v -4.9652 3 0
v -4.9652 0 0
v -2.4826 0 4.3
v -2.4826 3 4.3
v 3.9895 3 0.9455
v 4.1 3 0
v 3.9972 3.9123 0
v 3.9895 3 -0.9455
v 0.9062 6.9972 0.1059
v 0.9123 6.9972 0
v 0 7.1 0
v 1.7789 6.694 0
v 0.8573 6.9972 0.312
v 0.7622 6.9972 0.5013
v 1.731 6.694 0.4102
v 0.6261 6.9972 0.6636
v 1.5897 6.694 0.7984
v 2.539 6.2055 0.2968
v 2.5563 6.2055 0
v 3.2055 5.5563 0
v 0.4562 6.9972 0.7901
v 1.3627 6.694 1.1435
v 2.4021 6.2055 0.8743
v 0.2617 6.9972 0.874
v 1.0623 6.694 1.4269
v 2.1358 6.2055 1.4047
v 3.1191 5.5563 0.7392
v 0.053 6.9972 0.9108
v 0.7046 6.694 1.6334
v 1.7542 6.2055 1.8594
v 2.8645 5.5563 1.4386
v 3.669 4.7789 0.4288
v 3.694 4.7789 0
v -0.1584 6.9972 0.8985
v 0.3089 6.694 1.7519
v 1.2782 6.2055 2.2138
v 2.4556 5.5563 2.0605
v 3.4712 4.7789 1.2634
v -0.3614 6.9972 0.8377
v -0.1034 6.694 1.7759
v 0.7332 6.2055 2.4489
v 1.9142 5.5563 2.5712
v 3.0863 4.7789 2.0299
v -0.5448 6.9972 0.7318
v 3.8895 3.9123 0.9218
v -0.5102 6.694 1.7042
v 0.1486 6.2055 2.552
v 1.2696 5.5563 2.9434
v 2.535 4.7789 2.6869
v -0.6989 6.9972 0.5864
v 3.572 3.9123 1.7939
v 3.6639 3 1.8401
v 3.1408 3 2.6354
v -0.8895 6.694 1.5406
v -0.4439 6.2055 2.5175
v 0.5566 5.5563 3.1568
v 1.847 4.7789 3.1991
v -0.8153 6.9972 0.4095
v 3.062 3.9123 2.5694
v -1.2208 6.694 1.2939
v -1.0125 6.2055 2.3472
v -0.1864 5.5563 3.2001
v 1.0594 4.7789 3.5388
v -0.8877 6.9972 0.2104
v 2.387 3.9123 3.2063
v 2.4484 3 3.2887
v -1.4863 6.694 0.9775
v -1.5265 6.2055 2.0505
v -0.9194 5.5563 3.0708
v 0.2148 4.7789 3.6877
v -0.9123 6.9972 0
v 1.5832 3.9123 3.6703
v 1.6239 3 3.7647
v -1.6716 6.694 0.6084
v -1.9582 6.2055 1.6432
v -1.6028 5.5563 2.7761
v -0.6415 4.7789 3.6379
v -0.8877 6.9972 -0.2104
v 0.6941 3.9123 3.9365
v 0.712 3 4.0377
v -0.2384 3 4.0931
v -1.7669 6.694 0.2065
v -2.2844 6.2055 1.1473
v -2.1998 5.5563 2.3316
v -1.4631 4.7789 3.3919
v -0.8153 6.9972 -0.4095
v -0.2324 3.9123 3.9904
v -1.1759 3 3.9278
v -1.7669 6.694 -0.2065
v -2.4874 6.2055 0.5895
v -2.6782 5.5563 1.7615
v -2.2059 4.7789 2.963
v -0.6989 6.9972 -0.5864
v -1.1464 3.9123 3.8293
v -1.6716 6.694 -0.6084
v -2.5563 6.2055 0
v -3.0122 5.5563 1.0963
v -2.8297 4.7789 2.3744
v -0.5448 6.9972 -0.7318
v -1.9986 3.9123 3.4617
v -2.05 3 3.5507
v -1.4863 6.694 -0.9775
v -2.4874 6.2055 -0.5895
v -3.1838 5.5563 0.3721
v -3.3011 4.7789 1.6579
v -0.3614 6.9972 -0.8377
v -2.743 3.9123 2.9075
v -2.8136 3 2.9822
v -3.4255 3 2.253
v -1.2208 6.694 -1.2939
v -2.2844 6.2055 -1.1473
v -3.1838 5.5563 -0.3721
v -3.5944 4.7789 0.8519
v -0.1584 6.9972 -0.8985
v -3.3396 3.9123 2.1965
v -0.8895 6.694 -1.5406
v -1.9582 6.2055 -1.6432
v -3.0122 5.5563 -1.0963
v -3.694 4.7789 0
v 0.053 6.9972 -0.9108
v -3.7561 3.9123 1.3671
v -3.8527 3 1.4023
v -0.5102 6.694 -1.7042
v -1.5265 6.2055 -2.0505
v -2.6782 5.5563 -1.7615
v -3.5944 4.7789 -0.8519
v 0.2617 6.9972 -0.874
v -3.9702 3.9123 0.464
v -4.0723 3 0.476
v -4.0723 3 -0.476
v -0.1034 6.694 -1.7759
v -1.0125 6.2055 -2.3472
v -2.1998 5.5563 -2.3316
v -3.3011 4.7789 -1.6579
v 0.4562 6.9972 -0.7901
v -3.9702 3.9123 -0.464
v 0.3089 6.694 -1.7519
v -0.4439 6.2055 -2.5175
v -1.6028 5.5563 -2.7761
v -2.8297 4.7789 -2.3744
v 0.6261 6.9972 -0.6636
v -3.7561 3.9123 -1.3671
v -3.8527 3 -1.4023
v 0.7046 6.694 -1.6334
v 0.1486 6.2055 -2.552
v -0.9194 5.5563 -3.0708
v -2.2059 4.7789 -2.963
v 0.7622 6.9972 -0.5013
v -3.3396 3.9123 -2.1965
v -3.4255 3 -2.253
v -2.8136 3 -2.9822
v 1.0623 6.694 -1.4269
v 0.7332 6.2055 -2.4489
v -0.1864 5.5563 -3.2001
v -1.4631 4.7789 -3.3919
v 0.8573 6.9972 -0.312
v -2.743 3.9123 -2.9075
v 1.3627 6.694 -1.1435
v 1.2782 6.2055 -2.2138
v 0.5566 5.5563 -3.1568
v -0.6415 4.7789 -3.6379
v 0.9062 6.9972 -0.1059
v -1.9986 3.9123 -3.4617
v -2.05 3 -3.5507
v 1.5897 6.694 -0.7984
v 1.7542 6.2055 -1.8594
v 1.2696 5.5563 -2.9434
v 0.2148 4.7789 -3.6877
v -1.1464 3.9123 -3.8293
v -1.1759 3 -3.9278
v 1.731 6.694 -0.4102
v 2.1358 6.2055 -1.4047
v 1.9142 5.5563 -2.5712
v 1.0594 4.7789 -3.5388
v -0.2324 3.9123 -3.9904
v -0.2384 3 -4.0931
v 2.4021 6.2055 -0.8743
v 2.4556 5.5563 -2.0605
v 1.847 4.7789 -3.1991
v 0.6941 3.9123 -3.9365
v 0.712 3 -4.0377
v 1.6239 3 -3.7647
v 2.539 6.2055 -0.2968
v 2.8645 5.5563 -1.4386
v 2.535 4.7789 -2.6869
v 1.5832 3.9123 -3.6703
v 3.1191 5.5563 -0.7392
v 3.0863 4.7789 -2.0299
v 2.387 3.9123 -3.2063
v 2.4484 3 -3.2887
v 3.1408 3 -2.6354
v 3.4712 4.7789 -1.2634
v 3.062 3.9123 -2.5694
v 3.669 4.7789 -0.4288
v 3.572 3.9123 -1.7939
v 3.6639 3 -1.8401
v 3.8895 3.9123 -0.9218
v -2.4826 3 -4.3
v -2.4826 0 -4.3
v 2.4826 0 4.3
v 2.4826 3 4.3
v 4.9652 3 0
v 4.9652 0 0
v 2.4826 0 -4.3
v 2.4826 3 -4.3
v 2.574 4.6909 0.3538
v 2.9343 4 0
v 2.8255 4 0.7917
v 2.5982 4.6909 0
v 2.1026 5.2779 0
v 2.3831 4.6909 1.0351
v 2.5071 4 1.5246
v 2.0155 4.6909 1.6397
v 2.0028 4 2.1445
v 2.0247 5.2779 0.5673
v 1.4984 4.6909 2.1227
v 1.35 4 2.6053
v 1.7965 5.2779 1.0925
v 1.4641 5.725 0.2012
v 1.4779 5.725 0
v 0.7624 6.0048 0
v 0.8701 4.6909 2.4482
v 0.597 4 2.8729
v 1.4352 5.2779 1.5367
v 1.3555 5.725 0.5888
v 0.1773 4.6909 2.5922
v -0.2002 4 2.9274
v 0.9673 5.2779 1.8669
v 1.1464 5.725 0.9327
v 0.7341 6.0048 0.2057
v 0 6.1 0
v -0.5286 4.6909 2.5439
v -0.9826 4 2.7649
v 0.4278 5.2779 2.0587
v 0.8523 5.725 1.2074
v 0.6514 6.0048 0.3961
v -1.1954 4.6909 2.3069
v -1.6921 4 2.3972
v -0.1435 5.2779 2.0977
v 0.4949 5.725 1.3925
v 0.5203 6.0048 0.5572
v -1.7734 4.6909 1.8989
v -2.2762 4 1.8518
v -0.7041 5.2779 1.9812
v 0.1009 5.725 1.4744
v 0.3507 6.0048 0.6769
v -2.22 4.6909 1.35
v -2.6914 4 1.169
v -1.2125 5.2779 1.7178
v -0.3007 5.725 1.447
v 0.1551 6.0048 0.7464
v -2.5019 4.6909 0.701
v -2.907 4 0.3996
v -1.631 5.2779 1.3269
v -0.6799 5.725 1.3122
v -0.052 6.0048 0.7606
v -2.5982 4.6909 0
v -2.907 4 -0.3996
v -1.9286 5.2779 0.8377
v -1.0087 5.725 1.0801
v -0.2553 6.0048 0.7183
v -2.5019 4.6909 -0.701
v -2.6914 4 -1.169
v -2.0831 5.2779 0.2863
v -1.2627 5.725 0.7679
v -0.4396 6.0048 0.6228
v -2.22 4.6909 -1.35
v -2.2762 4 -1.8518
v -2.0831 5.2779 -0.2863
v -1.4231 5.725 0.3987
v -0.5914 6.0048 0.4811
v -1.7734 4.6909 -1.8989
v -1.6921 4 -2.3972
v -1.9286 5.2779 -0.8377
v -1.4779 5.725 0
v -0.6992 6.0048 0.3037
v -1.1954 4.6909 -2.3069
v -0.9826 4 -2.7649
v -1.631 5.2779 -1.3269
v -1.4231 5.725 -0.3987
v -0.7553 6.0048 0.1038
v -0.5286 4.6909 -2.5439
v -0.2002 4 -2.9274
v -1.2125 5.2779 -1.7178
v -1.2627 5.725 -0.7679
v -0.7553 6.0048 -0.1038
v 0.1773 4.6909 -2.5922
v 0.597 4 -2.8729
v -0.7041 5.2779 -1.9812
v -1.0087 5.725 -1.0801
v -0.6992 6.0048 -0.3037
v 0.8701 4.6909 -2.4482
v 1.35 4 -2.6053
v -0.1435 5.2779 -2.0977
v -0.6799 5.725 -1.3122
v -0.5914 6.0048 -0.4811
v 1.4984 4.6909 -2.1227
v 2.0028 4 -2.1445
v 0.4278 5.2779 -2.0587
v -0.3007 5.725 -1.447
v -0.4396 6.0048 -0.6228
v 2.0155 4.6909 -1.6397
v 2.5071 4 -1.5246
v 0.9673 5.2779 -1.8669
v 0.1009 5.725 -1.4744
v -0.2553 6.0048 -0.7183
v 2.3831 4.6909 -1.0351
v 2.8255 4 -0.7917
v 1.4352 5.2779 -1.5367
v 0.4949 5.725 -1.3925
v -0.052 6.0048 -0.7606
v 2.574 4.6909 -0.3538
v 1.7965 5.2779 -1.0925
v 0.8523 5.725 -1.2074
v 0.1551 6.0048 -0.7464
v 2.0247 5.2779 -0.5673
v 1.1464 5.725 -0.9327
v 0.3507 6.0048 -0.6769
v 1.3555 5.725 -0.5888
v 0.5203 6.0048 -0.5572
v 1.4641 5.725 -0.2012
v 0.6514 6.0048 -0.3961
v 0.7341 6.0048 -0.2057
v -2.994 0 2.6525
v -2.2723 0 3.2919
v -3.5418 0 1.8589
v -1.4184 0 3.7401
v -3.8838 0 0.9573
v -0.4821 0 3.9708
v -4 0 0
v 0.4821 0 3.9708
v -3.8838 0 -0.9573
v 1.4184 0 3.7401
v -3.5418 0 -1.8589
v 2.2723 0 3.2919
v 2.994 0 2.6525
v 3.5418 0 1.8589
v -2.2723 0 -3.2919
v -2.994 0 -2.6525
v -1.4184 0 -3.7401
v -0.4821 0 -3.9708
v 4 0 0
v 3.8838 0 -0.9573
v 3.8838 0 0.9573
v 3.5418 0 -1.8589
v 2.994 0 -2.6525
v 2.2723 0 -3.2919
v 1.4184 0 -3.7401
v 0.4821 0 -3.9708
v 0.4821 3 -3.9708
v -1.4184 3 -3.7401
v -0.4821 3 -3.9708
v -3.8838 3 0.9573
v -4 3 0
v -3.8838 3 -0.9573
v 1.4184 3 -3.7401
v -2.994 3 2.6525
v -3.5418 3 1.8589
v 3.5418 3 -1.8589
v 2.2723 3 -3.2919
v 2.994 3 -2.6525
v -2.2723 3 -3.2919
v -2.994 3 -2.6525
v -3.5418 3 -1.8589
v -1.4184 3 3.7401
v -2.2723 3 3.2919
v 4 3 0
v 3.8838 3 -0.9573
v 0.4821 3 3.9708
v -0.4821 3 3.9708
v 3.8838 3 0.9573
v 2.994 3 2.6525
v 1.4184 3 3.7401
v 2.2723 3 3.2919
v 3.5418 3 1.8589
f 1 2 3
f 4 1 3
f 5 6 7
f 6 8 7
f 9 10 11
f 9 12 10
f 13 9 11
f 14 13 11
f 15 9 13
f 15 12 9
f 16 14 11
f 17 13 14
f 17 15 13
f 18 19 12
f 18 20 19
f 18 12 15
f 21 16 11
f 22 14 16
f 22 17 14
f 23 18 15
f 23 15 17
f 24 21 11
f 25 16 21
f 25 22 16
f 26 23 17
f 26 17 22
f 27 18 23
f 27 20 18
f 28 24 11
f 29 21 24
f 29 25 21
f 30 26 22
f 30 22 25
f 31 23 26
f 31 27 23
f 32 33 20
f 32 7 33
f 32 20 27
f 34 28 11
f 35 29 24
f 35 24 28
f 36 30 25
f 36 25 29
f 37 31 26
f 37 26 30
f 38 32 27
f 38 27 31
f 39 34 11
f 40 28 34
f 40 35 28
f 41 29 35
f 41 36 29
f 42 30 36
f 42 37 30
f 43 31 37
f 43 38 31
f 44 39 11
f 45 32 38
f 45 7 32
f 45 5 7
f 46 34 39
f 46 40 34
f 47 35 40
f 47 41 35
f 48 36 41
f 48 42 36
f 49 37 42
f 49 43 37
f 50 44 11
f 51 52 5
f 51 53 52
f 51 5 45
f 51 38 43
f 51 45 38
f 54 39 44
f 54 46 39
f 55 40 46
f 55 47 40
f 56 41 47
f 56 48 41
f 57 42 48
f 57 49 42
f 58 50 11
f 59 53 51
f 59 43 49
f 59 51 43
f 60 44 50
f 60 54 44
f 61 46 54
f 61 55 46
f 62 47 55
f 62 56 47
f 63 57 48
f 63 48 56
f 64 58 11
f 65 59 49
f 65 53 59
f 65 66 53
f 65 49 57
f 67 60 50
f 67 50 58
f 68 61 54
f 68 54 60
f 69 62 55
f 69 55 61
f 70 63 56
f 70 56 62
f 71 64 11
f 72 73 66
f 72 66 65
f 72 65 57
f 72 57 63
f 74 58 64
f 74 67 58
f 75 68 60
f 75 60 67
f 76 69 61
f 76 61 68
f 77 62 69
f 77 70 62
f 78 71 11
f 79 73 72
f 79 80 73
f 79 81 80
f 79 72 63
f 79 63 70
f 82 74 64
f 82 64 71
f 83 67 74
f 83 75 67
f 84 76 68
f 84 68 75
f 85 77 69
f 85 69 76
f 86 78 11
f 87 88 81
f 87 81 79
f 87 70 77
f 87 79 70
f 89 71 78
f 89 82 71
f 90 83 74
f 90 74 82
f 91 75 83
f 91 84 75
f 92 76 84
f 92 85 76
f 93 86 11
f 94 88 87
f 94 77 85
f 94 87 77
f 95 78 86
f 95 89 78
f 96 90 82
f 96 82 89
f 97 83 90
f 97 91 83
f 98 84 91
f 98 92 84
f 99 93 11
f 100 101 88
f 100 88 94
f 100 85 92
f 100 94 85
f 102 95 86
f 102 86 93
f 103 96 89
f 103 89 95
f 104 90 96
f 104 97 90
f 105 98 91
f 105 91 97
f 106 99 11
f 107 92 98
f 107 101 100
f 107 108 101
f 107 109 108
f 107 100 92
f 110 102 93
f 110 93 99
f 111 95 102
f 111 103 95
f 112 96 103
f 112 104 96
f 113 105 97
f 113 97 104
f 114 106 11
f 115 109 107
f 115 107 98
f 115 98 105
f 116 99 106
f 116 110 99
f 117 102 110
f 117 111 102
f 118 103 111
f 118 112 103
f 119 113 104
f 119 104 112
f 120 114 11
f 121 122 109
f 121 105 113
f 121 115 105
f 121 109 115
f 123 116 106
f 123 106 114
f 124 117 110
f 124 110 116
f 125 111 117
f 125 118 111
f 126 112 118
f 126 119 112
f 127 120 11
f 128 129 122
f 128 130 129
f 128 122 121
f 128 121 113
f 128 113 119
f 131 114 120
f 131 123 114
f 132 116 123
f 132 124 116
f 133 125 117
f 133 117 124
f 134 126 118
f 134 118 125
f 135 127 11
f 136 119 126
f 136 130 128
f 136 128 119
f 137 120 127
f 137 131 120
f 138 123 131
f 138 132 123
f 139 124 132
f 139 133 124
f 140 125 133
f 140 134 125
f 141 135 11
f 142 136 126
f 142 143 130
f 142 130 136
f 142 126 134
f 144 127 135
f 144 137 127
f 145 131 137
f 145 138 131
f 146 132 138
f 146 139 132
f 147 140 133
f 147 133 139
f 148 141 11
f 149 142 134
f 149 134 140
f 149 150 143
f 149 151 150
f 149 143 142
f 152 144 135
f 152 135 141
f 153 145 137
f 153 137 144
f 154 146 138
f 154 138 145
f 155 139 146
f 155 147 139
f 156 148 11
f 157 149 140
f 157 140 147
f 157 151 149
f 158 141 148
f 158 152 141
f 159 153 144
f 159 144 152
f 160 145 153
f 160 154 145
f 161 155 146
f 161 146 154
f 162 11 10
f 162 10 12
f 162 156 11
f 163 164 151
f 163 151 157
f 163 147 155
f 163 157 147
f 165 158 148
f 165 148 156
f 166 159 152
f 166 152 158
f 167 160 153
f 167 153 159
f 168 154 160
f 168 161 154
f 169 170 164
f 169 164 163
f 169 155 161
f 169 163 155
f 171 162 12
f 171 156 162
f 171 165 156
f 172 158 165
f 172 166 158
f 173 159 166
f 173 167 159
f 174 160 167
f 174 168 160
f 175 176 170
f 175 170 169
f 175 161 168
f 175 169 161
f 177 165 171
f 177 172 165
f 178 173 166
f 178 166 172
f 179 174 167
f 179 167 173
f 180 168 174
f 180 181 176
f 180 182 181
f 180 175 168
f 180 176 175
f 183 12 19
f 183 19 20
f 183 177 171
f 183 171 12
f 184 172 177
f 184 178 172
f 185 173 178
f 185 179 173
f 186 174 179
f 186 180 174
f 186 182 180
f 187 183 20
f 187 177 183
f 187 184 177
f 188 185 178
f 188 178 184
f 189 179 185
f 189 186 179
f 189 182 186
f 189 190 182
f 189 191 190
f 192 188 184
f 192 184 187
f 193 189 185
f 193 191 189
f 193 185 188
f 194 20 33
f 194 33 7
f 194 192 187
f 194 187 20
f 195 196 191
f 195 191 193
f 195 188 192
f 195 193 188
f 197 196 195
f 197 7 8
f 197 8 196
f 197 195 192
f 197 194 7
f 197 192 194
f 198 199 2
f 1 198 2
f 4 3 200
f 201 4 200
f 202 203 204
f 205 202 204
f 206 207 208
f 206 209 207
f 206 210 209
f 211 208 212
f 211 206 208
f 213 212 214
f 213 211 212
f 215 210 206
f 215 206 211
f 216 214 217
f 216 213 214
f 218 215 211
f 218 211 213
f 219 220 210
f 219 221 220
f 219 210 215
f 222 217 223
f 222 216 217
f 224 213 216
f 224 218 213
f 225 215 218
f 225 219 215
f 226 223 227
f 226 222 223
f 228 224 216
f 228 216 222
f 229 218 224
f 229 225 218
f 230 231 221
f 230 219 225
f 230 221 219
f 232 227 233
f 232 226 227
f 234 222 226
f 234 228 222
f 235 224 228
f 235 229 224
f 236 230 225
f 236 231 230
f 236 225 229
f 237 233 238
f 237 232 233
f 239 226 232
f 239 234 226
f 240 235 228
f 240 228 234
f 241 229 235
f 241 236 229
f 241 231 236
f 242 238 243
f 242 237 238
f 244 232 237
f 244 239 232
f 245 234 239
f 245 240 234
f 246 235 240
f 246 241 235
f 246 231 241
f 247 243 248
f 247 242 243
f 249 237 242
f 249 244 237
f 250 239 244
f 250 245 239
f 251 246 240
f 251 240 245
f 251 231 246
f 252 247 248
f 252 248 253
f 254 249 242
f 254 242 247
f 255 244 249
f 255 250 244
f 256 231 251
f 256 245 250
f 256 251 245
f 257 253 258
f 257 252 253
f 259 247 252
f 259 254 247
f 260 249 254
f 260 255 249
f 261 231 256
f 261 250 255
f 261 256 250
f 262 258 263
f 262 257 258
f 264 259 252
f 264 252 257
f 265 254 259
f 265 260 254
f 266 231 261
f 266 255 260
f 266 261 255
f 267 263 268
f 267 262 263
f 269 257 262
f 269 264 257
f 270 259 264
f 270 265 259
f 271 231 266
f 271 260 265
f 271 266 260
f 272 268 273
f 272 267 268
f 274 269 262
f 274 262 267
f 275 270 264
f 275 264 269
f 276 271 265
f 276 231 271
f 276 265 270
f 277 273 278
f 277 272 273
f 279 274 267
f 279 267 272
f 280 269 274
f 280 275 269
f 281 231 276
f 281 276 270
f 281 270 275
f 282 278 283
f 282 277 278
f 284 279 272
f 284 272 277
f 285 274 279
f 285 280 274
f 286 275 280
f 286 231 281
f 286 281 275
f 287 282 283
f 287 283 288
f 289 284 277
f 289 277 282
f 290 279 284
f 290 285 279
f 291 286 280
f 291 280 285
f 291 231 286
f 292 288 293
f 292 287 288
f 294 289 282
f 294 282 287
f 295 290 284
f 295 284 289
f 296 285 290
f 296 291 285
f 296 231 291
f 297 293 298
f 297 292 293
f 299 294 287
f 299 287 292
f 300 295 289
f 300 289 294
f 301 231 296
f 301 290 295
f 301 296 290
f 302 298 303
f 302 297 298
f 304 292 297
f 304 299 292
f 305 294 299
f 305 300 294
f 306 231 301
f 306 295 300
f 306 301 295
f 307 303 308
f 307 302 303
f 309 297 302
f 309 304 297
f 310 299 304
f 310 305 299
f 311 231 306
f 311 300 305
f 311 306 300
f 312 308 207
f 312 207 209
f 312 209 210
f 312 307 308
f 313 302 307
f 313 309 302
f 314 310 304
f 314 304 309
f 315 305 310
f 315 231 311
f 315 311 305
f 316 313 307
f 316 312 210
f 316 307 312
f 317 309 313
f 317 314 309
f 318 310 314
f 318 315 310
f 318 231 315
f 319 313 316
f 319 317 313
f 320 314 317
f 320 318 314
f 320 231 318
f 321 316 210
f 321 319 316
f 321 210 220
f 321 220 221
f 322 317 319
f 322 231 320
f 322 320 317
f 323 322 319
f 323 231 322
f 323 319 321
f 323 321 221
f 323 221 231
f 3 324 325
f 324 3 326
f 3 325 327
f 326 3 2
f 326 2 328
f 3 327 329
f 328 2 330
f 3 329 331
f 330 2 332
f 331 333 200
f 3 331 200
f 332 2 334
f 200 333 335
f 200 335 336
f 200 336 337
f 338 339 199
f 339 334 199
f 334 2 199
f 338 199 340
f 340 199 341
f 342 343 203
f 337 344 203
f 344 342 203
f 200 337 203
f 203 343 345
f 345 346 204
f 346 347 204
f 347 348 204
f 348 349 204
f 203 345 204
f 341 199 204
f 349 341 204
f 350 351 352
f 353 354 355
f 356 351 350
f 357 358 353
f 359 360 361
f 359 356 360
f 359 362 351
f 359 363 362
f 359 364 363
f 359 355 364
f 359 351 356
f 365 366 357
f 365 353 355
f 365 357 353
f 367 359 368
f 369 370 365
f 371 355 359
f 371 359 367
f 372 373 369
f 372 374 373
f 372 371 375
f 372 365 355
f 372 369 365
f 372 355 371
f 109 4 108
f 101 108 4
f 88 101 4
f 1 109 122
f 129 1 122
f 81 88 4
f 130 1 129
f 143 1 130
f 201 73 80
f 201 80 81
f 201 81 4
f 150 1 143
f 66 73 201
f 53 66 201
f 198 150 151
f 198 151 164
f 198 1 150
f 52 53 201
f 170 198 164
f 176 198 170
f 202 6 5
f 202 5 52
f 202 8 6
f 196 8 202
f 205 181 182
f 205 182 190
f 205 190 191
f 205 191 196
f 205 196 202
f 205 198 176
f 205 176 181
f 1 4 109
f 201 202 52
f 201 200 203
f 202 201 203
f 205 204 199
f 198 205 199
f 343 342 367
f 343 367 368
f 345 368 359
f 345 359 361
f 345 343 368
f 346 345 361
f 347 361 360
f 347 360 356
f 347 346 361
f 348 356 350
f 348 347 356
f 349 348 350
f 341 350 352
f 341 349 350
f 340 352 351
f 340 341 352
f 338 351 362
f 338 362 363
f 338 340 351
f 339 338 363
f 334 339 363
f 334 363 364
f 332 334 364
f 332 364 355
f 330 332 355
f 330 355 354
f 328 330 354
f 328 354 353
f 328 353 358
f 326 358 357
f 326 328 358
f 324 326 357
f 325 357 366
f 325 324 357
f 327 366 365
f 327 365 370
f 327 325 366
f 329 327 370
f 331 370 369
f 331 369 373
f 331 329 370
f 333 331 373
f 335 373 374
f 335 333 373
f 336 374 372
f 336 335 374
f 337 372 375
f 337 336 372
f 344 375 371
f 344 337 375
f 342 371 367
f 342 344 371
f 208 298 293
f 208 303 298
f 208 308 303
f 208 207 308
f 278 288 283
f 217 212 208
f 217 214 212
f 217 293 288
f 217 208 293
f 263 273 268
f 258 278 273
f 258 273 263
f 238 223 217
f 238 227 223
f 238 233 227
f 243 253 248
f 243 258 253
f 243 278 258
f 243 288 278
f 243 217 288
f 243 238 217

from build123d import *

# Parameters (mm, degrees)
SKETCH1_R           = 4
BOSS_EXTRUDE1_DEPTH = 3


with BuildPart() as part:
    # Sketch1 → Boss-Extrude1 (new body)
    with BuildSketch(Plane(origin=(0, 0, 0), x_dir=(1, 0, 0), z_dir=(0, 1, 0))):
        Polygon((4.965212315, 0), (2.482606158, 4.3), (-2.482606158, 4.3), (-4.965212315, 0), (-2.482606158, -4.3), (2.482606158, -4.3), align=None)
        Circle(SKETCH1_R, mode=Mode.SUBTRACT)
    extrude(amount=BOSS_EXTRUDE1_DEPTH)

    # Sketch2 → Revolve-Thin1 (revolve)
    with BuildSketch(Plane.XY):
        with BuildLine():
            ThreePointArc((0, 7.1), (2.899137803, 5.899137803), (4.1, 3))
            Line((4.1, 3), (0, 3))
            Line((0, 3), (0, 4))
            Line((0, 4), (2.93428015, 4))
            ThreePointArc((2.93428015, 4), (1.804161855, 5.520912533), (0, 6.1))
            Line((0, 6.1), (0, 7.1))
        make_face()
    revolve(axis=Axis((0, 7.455, 0), (0, -1, 0)))


solid = part.part
